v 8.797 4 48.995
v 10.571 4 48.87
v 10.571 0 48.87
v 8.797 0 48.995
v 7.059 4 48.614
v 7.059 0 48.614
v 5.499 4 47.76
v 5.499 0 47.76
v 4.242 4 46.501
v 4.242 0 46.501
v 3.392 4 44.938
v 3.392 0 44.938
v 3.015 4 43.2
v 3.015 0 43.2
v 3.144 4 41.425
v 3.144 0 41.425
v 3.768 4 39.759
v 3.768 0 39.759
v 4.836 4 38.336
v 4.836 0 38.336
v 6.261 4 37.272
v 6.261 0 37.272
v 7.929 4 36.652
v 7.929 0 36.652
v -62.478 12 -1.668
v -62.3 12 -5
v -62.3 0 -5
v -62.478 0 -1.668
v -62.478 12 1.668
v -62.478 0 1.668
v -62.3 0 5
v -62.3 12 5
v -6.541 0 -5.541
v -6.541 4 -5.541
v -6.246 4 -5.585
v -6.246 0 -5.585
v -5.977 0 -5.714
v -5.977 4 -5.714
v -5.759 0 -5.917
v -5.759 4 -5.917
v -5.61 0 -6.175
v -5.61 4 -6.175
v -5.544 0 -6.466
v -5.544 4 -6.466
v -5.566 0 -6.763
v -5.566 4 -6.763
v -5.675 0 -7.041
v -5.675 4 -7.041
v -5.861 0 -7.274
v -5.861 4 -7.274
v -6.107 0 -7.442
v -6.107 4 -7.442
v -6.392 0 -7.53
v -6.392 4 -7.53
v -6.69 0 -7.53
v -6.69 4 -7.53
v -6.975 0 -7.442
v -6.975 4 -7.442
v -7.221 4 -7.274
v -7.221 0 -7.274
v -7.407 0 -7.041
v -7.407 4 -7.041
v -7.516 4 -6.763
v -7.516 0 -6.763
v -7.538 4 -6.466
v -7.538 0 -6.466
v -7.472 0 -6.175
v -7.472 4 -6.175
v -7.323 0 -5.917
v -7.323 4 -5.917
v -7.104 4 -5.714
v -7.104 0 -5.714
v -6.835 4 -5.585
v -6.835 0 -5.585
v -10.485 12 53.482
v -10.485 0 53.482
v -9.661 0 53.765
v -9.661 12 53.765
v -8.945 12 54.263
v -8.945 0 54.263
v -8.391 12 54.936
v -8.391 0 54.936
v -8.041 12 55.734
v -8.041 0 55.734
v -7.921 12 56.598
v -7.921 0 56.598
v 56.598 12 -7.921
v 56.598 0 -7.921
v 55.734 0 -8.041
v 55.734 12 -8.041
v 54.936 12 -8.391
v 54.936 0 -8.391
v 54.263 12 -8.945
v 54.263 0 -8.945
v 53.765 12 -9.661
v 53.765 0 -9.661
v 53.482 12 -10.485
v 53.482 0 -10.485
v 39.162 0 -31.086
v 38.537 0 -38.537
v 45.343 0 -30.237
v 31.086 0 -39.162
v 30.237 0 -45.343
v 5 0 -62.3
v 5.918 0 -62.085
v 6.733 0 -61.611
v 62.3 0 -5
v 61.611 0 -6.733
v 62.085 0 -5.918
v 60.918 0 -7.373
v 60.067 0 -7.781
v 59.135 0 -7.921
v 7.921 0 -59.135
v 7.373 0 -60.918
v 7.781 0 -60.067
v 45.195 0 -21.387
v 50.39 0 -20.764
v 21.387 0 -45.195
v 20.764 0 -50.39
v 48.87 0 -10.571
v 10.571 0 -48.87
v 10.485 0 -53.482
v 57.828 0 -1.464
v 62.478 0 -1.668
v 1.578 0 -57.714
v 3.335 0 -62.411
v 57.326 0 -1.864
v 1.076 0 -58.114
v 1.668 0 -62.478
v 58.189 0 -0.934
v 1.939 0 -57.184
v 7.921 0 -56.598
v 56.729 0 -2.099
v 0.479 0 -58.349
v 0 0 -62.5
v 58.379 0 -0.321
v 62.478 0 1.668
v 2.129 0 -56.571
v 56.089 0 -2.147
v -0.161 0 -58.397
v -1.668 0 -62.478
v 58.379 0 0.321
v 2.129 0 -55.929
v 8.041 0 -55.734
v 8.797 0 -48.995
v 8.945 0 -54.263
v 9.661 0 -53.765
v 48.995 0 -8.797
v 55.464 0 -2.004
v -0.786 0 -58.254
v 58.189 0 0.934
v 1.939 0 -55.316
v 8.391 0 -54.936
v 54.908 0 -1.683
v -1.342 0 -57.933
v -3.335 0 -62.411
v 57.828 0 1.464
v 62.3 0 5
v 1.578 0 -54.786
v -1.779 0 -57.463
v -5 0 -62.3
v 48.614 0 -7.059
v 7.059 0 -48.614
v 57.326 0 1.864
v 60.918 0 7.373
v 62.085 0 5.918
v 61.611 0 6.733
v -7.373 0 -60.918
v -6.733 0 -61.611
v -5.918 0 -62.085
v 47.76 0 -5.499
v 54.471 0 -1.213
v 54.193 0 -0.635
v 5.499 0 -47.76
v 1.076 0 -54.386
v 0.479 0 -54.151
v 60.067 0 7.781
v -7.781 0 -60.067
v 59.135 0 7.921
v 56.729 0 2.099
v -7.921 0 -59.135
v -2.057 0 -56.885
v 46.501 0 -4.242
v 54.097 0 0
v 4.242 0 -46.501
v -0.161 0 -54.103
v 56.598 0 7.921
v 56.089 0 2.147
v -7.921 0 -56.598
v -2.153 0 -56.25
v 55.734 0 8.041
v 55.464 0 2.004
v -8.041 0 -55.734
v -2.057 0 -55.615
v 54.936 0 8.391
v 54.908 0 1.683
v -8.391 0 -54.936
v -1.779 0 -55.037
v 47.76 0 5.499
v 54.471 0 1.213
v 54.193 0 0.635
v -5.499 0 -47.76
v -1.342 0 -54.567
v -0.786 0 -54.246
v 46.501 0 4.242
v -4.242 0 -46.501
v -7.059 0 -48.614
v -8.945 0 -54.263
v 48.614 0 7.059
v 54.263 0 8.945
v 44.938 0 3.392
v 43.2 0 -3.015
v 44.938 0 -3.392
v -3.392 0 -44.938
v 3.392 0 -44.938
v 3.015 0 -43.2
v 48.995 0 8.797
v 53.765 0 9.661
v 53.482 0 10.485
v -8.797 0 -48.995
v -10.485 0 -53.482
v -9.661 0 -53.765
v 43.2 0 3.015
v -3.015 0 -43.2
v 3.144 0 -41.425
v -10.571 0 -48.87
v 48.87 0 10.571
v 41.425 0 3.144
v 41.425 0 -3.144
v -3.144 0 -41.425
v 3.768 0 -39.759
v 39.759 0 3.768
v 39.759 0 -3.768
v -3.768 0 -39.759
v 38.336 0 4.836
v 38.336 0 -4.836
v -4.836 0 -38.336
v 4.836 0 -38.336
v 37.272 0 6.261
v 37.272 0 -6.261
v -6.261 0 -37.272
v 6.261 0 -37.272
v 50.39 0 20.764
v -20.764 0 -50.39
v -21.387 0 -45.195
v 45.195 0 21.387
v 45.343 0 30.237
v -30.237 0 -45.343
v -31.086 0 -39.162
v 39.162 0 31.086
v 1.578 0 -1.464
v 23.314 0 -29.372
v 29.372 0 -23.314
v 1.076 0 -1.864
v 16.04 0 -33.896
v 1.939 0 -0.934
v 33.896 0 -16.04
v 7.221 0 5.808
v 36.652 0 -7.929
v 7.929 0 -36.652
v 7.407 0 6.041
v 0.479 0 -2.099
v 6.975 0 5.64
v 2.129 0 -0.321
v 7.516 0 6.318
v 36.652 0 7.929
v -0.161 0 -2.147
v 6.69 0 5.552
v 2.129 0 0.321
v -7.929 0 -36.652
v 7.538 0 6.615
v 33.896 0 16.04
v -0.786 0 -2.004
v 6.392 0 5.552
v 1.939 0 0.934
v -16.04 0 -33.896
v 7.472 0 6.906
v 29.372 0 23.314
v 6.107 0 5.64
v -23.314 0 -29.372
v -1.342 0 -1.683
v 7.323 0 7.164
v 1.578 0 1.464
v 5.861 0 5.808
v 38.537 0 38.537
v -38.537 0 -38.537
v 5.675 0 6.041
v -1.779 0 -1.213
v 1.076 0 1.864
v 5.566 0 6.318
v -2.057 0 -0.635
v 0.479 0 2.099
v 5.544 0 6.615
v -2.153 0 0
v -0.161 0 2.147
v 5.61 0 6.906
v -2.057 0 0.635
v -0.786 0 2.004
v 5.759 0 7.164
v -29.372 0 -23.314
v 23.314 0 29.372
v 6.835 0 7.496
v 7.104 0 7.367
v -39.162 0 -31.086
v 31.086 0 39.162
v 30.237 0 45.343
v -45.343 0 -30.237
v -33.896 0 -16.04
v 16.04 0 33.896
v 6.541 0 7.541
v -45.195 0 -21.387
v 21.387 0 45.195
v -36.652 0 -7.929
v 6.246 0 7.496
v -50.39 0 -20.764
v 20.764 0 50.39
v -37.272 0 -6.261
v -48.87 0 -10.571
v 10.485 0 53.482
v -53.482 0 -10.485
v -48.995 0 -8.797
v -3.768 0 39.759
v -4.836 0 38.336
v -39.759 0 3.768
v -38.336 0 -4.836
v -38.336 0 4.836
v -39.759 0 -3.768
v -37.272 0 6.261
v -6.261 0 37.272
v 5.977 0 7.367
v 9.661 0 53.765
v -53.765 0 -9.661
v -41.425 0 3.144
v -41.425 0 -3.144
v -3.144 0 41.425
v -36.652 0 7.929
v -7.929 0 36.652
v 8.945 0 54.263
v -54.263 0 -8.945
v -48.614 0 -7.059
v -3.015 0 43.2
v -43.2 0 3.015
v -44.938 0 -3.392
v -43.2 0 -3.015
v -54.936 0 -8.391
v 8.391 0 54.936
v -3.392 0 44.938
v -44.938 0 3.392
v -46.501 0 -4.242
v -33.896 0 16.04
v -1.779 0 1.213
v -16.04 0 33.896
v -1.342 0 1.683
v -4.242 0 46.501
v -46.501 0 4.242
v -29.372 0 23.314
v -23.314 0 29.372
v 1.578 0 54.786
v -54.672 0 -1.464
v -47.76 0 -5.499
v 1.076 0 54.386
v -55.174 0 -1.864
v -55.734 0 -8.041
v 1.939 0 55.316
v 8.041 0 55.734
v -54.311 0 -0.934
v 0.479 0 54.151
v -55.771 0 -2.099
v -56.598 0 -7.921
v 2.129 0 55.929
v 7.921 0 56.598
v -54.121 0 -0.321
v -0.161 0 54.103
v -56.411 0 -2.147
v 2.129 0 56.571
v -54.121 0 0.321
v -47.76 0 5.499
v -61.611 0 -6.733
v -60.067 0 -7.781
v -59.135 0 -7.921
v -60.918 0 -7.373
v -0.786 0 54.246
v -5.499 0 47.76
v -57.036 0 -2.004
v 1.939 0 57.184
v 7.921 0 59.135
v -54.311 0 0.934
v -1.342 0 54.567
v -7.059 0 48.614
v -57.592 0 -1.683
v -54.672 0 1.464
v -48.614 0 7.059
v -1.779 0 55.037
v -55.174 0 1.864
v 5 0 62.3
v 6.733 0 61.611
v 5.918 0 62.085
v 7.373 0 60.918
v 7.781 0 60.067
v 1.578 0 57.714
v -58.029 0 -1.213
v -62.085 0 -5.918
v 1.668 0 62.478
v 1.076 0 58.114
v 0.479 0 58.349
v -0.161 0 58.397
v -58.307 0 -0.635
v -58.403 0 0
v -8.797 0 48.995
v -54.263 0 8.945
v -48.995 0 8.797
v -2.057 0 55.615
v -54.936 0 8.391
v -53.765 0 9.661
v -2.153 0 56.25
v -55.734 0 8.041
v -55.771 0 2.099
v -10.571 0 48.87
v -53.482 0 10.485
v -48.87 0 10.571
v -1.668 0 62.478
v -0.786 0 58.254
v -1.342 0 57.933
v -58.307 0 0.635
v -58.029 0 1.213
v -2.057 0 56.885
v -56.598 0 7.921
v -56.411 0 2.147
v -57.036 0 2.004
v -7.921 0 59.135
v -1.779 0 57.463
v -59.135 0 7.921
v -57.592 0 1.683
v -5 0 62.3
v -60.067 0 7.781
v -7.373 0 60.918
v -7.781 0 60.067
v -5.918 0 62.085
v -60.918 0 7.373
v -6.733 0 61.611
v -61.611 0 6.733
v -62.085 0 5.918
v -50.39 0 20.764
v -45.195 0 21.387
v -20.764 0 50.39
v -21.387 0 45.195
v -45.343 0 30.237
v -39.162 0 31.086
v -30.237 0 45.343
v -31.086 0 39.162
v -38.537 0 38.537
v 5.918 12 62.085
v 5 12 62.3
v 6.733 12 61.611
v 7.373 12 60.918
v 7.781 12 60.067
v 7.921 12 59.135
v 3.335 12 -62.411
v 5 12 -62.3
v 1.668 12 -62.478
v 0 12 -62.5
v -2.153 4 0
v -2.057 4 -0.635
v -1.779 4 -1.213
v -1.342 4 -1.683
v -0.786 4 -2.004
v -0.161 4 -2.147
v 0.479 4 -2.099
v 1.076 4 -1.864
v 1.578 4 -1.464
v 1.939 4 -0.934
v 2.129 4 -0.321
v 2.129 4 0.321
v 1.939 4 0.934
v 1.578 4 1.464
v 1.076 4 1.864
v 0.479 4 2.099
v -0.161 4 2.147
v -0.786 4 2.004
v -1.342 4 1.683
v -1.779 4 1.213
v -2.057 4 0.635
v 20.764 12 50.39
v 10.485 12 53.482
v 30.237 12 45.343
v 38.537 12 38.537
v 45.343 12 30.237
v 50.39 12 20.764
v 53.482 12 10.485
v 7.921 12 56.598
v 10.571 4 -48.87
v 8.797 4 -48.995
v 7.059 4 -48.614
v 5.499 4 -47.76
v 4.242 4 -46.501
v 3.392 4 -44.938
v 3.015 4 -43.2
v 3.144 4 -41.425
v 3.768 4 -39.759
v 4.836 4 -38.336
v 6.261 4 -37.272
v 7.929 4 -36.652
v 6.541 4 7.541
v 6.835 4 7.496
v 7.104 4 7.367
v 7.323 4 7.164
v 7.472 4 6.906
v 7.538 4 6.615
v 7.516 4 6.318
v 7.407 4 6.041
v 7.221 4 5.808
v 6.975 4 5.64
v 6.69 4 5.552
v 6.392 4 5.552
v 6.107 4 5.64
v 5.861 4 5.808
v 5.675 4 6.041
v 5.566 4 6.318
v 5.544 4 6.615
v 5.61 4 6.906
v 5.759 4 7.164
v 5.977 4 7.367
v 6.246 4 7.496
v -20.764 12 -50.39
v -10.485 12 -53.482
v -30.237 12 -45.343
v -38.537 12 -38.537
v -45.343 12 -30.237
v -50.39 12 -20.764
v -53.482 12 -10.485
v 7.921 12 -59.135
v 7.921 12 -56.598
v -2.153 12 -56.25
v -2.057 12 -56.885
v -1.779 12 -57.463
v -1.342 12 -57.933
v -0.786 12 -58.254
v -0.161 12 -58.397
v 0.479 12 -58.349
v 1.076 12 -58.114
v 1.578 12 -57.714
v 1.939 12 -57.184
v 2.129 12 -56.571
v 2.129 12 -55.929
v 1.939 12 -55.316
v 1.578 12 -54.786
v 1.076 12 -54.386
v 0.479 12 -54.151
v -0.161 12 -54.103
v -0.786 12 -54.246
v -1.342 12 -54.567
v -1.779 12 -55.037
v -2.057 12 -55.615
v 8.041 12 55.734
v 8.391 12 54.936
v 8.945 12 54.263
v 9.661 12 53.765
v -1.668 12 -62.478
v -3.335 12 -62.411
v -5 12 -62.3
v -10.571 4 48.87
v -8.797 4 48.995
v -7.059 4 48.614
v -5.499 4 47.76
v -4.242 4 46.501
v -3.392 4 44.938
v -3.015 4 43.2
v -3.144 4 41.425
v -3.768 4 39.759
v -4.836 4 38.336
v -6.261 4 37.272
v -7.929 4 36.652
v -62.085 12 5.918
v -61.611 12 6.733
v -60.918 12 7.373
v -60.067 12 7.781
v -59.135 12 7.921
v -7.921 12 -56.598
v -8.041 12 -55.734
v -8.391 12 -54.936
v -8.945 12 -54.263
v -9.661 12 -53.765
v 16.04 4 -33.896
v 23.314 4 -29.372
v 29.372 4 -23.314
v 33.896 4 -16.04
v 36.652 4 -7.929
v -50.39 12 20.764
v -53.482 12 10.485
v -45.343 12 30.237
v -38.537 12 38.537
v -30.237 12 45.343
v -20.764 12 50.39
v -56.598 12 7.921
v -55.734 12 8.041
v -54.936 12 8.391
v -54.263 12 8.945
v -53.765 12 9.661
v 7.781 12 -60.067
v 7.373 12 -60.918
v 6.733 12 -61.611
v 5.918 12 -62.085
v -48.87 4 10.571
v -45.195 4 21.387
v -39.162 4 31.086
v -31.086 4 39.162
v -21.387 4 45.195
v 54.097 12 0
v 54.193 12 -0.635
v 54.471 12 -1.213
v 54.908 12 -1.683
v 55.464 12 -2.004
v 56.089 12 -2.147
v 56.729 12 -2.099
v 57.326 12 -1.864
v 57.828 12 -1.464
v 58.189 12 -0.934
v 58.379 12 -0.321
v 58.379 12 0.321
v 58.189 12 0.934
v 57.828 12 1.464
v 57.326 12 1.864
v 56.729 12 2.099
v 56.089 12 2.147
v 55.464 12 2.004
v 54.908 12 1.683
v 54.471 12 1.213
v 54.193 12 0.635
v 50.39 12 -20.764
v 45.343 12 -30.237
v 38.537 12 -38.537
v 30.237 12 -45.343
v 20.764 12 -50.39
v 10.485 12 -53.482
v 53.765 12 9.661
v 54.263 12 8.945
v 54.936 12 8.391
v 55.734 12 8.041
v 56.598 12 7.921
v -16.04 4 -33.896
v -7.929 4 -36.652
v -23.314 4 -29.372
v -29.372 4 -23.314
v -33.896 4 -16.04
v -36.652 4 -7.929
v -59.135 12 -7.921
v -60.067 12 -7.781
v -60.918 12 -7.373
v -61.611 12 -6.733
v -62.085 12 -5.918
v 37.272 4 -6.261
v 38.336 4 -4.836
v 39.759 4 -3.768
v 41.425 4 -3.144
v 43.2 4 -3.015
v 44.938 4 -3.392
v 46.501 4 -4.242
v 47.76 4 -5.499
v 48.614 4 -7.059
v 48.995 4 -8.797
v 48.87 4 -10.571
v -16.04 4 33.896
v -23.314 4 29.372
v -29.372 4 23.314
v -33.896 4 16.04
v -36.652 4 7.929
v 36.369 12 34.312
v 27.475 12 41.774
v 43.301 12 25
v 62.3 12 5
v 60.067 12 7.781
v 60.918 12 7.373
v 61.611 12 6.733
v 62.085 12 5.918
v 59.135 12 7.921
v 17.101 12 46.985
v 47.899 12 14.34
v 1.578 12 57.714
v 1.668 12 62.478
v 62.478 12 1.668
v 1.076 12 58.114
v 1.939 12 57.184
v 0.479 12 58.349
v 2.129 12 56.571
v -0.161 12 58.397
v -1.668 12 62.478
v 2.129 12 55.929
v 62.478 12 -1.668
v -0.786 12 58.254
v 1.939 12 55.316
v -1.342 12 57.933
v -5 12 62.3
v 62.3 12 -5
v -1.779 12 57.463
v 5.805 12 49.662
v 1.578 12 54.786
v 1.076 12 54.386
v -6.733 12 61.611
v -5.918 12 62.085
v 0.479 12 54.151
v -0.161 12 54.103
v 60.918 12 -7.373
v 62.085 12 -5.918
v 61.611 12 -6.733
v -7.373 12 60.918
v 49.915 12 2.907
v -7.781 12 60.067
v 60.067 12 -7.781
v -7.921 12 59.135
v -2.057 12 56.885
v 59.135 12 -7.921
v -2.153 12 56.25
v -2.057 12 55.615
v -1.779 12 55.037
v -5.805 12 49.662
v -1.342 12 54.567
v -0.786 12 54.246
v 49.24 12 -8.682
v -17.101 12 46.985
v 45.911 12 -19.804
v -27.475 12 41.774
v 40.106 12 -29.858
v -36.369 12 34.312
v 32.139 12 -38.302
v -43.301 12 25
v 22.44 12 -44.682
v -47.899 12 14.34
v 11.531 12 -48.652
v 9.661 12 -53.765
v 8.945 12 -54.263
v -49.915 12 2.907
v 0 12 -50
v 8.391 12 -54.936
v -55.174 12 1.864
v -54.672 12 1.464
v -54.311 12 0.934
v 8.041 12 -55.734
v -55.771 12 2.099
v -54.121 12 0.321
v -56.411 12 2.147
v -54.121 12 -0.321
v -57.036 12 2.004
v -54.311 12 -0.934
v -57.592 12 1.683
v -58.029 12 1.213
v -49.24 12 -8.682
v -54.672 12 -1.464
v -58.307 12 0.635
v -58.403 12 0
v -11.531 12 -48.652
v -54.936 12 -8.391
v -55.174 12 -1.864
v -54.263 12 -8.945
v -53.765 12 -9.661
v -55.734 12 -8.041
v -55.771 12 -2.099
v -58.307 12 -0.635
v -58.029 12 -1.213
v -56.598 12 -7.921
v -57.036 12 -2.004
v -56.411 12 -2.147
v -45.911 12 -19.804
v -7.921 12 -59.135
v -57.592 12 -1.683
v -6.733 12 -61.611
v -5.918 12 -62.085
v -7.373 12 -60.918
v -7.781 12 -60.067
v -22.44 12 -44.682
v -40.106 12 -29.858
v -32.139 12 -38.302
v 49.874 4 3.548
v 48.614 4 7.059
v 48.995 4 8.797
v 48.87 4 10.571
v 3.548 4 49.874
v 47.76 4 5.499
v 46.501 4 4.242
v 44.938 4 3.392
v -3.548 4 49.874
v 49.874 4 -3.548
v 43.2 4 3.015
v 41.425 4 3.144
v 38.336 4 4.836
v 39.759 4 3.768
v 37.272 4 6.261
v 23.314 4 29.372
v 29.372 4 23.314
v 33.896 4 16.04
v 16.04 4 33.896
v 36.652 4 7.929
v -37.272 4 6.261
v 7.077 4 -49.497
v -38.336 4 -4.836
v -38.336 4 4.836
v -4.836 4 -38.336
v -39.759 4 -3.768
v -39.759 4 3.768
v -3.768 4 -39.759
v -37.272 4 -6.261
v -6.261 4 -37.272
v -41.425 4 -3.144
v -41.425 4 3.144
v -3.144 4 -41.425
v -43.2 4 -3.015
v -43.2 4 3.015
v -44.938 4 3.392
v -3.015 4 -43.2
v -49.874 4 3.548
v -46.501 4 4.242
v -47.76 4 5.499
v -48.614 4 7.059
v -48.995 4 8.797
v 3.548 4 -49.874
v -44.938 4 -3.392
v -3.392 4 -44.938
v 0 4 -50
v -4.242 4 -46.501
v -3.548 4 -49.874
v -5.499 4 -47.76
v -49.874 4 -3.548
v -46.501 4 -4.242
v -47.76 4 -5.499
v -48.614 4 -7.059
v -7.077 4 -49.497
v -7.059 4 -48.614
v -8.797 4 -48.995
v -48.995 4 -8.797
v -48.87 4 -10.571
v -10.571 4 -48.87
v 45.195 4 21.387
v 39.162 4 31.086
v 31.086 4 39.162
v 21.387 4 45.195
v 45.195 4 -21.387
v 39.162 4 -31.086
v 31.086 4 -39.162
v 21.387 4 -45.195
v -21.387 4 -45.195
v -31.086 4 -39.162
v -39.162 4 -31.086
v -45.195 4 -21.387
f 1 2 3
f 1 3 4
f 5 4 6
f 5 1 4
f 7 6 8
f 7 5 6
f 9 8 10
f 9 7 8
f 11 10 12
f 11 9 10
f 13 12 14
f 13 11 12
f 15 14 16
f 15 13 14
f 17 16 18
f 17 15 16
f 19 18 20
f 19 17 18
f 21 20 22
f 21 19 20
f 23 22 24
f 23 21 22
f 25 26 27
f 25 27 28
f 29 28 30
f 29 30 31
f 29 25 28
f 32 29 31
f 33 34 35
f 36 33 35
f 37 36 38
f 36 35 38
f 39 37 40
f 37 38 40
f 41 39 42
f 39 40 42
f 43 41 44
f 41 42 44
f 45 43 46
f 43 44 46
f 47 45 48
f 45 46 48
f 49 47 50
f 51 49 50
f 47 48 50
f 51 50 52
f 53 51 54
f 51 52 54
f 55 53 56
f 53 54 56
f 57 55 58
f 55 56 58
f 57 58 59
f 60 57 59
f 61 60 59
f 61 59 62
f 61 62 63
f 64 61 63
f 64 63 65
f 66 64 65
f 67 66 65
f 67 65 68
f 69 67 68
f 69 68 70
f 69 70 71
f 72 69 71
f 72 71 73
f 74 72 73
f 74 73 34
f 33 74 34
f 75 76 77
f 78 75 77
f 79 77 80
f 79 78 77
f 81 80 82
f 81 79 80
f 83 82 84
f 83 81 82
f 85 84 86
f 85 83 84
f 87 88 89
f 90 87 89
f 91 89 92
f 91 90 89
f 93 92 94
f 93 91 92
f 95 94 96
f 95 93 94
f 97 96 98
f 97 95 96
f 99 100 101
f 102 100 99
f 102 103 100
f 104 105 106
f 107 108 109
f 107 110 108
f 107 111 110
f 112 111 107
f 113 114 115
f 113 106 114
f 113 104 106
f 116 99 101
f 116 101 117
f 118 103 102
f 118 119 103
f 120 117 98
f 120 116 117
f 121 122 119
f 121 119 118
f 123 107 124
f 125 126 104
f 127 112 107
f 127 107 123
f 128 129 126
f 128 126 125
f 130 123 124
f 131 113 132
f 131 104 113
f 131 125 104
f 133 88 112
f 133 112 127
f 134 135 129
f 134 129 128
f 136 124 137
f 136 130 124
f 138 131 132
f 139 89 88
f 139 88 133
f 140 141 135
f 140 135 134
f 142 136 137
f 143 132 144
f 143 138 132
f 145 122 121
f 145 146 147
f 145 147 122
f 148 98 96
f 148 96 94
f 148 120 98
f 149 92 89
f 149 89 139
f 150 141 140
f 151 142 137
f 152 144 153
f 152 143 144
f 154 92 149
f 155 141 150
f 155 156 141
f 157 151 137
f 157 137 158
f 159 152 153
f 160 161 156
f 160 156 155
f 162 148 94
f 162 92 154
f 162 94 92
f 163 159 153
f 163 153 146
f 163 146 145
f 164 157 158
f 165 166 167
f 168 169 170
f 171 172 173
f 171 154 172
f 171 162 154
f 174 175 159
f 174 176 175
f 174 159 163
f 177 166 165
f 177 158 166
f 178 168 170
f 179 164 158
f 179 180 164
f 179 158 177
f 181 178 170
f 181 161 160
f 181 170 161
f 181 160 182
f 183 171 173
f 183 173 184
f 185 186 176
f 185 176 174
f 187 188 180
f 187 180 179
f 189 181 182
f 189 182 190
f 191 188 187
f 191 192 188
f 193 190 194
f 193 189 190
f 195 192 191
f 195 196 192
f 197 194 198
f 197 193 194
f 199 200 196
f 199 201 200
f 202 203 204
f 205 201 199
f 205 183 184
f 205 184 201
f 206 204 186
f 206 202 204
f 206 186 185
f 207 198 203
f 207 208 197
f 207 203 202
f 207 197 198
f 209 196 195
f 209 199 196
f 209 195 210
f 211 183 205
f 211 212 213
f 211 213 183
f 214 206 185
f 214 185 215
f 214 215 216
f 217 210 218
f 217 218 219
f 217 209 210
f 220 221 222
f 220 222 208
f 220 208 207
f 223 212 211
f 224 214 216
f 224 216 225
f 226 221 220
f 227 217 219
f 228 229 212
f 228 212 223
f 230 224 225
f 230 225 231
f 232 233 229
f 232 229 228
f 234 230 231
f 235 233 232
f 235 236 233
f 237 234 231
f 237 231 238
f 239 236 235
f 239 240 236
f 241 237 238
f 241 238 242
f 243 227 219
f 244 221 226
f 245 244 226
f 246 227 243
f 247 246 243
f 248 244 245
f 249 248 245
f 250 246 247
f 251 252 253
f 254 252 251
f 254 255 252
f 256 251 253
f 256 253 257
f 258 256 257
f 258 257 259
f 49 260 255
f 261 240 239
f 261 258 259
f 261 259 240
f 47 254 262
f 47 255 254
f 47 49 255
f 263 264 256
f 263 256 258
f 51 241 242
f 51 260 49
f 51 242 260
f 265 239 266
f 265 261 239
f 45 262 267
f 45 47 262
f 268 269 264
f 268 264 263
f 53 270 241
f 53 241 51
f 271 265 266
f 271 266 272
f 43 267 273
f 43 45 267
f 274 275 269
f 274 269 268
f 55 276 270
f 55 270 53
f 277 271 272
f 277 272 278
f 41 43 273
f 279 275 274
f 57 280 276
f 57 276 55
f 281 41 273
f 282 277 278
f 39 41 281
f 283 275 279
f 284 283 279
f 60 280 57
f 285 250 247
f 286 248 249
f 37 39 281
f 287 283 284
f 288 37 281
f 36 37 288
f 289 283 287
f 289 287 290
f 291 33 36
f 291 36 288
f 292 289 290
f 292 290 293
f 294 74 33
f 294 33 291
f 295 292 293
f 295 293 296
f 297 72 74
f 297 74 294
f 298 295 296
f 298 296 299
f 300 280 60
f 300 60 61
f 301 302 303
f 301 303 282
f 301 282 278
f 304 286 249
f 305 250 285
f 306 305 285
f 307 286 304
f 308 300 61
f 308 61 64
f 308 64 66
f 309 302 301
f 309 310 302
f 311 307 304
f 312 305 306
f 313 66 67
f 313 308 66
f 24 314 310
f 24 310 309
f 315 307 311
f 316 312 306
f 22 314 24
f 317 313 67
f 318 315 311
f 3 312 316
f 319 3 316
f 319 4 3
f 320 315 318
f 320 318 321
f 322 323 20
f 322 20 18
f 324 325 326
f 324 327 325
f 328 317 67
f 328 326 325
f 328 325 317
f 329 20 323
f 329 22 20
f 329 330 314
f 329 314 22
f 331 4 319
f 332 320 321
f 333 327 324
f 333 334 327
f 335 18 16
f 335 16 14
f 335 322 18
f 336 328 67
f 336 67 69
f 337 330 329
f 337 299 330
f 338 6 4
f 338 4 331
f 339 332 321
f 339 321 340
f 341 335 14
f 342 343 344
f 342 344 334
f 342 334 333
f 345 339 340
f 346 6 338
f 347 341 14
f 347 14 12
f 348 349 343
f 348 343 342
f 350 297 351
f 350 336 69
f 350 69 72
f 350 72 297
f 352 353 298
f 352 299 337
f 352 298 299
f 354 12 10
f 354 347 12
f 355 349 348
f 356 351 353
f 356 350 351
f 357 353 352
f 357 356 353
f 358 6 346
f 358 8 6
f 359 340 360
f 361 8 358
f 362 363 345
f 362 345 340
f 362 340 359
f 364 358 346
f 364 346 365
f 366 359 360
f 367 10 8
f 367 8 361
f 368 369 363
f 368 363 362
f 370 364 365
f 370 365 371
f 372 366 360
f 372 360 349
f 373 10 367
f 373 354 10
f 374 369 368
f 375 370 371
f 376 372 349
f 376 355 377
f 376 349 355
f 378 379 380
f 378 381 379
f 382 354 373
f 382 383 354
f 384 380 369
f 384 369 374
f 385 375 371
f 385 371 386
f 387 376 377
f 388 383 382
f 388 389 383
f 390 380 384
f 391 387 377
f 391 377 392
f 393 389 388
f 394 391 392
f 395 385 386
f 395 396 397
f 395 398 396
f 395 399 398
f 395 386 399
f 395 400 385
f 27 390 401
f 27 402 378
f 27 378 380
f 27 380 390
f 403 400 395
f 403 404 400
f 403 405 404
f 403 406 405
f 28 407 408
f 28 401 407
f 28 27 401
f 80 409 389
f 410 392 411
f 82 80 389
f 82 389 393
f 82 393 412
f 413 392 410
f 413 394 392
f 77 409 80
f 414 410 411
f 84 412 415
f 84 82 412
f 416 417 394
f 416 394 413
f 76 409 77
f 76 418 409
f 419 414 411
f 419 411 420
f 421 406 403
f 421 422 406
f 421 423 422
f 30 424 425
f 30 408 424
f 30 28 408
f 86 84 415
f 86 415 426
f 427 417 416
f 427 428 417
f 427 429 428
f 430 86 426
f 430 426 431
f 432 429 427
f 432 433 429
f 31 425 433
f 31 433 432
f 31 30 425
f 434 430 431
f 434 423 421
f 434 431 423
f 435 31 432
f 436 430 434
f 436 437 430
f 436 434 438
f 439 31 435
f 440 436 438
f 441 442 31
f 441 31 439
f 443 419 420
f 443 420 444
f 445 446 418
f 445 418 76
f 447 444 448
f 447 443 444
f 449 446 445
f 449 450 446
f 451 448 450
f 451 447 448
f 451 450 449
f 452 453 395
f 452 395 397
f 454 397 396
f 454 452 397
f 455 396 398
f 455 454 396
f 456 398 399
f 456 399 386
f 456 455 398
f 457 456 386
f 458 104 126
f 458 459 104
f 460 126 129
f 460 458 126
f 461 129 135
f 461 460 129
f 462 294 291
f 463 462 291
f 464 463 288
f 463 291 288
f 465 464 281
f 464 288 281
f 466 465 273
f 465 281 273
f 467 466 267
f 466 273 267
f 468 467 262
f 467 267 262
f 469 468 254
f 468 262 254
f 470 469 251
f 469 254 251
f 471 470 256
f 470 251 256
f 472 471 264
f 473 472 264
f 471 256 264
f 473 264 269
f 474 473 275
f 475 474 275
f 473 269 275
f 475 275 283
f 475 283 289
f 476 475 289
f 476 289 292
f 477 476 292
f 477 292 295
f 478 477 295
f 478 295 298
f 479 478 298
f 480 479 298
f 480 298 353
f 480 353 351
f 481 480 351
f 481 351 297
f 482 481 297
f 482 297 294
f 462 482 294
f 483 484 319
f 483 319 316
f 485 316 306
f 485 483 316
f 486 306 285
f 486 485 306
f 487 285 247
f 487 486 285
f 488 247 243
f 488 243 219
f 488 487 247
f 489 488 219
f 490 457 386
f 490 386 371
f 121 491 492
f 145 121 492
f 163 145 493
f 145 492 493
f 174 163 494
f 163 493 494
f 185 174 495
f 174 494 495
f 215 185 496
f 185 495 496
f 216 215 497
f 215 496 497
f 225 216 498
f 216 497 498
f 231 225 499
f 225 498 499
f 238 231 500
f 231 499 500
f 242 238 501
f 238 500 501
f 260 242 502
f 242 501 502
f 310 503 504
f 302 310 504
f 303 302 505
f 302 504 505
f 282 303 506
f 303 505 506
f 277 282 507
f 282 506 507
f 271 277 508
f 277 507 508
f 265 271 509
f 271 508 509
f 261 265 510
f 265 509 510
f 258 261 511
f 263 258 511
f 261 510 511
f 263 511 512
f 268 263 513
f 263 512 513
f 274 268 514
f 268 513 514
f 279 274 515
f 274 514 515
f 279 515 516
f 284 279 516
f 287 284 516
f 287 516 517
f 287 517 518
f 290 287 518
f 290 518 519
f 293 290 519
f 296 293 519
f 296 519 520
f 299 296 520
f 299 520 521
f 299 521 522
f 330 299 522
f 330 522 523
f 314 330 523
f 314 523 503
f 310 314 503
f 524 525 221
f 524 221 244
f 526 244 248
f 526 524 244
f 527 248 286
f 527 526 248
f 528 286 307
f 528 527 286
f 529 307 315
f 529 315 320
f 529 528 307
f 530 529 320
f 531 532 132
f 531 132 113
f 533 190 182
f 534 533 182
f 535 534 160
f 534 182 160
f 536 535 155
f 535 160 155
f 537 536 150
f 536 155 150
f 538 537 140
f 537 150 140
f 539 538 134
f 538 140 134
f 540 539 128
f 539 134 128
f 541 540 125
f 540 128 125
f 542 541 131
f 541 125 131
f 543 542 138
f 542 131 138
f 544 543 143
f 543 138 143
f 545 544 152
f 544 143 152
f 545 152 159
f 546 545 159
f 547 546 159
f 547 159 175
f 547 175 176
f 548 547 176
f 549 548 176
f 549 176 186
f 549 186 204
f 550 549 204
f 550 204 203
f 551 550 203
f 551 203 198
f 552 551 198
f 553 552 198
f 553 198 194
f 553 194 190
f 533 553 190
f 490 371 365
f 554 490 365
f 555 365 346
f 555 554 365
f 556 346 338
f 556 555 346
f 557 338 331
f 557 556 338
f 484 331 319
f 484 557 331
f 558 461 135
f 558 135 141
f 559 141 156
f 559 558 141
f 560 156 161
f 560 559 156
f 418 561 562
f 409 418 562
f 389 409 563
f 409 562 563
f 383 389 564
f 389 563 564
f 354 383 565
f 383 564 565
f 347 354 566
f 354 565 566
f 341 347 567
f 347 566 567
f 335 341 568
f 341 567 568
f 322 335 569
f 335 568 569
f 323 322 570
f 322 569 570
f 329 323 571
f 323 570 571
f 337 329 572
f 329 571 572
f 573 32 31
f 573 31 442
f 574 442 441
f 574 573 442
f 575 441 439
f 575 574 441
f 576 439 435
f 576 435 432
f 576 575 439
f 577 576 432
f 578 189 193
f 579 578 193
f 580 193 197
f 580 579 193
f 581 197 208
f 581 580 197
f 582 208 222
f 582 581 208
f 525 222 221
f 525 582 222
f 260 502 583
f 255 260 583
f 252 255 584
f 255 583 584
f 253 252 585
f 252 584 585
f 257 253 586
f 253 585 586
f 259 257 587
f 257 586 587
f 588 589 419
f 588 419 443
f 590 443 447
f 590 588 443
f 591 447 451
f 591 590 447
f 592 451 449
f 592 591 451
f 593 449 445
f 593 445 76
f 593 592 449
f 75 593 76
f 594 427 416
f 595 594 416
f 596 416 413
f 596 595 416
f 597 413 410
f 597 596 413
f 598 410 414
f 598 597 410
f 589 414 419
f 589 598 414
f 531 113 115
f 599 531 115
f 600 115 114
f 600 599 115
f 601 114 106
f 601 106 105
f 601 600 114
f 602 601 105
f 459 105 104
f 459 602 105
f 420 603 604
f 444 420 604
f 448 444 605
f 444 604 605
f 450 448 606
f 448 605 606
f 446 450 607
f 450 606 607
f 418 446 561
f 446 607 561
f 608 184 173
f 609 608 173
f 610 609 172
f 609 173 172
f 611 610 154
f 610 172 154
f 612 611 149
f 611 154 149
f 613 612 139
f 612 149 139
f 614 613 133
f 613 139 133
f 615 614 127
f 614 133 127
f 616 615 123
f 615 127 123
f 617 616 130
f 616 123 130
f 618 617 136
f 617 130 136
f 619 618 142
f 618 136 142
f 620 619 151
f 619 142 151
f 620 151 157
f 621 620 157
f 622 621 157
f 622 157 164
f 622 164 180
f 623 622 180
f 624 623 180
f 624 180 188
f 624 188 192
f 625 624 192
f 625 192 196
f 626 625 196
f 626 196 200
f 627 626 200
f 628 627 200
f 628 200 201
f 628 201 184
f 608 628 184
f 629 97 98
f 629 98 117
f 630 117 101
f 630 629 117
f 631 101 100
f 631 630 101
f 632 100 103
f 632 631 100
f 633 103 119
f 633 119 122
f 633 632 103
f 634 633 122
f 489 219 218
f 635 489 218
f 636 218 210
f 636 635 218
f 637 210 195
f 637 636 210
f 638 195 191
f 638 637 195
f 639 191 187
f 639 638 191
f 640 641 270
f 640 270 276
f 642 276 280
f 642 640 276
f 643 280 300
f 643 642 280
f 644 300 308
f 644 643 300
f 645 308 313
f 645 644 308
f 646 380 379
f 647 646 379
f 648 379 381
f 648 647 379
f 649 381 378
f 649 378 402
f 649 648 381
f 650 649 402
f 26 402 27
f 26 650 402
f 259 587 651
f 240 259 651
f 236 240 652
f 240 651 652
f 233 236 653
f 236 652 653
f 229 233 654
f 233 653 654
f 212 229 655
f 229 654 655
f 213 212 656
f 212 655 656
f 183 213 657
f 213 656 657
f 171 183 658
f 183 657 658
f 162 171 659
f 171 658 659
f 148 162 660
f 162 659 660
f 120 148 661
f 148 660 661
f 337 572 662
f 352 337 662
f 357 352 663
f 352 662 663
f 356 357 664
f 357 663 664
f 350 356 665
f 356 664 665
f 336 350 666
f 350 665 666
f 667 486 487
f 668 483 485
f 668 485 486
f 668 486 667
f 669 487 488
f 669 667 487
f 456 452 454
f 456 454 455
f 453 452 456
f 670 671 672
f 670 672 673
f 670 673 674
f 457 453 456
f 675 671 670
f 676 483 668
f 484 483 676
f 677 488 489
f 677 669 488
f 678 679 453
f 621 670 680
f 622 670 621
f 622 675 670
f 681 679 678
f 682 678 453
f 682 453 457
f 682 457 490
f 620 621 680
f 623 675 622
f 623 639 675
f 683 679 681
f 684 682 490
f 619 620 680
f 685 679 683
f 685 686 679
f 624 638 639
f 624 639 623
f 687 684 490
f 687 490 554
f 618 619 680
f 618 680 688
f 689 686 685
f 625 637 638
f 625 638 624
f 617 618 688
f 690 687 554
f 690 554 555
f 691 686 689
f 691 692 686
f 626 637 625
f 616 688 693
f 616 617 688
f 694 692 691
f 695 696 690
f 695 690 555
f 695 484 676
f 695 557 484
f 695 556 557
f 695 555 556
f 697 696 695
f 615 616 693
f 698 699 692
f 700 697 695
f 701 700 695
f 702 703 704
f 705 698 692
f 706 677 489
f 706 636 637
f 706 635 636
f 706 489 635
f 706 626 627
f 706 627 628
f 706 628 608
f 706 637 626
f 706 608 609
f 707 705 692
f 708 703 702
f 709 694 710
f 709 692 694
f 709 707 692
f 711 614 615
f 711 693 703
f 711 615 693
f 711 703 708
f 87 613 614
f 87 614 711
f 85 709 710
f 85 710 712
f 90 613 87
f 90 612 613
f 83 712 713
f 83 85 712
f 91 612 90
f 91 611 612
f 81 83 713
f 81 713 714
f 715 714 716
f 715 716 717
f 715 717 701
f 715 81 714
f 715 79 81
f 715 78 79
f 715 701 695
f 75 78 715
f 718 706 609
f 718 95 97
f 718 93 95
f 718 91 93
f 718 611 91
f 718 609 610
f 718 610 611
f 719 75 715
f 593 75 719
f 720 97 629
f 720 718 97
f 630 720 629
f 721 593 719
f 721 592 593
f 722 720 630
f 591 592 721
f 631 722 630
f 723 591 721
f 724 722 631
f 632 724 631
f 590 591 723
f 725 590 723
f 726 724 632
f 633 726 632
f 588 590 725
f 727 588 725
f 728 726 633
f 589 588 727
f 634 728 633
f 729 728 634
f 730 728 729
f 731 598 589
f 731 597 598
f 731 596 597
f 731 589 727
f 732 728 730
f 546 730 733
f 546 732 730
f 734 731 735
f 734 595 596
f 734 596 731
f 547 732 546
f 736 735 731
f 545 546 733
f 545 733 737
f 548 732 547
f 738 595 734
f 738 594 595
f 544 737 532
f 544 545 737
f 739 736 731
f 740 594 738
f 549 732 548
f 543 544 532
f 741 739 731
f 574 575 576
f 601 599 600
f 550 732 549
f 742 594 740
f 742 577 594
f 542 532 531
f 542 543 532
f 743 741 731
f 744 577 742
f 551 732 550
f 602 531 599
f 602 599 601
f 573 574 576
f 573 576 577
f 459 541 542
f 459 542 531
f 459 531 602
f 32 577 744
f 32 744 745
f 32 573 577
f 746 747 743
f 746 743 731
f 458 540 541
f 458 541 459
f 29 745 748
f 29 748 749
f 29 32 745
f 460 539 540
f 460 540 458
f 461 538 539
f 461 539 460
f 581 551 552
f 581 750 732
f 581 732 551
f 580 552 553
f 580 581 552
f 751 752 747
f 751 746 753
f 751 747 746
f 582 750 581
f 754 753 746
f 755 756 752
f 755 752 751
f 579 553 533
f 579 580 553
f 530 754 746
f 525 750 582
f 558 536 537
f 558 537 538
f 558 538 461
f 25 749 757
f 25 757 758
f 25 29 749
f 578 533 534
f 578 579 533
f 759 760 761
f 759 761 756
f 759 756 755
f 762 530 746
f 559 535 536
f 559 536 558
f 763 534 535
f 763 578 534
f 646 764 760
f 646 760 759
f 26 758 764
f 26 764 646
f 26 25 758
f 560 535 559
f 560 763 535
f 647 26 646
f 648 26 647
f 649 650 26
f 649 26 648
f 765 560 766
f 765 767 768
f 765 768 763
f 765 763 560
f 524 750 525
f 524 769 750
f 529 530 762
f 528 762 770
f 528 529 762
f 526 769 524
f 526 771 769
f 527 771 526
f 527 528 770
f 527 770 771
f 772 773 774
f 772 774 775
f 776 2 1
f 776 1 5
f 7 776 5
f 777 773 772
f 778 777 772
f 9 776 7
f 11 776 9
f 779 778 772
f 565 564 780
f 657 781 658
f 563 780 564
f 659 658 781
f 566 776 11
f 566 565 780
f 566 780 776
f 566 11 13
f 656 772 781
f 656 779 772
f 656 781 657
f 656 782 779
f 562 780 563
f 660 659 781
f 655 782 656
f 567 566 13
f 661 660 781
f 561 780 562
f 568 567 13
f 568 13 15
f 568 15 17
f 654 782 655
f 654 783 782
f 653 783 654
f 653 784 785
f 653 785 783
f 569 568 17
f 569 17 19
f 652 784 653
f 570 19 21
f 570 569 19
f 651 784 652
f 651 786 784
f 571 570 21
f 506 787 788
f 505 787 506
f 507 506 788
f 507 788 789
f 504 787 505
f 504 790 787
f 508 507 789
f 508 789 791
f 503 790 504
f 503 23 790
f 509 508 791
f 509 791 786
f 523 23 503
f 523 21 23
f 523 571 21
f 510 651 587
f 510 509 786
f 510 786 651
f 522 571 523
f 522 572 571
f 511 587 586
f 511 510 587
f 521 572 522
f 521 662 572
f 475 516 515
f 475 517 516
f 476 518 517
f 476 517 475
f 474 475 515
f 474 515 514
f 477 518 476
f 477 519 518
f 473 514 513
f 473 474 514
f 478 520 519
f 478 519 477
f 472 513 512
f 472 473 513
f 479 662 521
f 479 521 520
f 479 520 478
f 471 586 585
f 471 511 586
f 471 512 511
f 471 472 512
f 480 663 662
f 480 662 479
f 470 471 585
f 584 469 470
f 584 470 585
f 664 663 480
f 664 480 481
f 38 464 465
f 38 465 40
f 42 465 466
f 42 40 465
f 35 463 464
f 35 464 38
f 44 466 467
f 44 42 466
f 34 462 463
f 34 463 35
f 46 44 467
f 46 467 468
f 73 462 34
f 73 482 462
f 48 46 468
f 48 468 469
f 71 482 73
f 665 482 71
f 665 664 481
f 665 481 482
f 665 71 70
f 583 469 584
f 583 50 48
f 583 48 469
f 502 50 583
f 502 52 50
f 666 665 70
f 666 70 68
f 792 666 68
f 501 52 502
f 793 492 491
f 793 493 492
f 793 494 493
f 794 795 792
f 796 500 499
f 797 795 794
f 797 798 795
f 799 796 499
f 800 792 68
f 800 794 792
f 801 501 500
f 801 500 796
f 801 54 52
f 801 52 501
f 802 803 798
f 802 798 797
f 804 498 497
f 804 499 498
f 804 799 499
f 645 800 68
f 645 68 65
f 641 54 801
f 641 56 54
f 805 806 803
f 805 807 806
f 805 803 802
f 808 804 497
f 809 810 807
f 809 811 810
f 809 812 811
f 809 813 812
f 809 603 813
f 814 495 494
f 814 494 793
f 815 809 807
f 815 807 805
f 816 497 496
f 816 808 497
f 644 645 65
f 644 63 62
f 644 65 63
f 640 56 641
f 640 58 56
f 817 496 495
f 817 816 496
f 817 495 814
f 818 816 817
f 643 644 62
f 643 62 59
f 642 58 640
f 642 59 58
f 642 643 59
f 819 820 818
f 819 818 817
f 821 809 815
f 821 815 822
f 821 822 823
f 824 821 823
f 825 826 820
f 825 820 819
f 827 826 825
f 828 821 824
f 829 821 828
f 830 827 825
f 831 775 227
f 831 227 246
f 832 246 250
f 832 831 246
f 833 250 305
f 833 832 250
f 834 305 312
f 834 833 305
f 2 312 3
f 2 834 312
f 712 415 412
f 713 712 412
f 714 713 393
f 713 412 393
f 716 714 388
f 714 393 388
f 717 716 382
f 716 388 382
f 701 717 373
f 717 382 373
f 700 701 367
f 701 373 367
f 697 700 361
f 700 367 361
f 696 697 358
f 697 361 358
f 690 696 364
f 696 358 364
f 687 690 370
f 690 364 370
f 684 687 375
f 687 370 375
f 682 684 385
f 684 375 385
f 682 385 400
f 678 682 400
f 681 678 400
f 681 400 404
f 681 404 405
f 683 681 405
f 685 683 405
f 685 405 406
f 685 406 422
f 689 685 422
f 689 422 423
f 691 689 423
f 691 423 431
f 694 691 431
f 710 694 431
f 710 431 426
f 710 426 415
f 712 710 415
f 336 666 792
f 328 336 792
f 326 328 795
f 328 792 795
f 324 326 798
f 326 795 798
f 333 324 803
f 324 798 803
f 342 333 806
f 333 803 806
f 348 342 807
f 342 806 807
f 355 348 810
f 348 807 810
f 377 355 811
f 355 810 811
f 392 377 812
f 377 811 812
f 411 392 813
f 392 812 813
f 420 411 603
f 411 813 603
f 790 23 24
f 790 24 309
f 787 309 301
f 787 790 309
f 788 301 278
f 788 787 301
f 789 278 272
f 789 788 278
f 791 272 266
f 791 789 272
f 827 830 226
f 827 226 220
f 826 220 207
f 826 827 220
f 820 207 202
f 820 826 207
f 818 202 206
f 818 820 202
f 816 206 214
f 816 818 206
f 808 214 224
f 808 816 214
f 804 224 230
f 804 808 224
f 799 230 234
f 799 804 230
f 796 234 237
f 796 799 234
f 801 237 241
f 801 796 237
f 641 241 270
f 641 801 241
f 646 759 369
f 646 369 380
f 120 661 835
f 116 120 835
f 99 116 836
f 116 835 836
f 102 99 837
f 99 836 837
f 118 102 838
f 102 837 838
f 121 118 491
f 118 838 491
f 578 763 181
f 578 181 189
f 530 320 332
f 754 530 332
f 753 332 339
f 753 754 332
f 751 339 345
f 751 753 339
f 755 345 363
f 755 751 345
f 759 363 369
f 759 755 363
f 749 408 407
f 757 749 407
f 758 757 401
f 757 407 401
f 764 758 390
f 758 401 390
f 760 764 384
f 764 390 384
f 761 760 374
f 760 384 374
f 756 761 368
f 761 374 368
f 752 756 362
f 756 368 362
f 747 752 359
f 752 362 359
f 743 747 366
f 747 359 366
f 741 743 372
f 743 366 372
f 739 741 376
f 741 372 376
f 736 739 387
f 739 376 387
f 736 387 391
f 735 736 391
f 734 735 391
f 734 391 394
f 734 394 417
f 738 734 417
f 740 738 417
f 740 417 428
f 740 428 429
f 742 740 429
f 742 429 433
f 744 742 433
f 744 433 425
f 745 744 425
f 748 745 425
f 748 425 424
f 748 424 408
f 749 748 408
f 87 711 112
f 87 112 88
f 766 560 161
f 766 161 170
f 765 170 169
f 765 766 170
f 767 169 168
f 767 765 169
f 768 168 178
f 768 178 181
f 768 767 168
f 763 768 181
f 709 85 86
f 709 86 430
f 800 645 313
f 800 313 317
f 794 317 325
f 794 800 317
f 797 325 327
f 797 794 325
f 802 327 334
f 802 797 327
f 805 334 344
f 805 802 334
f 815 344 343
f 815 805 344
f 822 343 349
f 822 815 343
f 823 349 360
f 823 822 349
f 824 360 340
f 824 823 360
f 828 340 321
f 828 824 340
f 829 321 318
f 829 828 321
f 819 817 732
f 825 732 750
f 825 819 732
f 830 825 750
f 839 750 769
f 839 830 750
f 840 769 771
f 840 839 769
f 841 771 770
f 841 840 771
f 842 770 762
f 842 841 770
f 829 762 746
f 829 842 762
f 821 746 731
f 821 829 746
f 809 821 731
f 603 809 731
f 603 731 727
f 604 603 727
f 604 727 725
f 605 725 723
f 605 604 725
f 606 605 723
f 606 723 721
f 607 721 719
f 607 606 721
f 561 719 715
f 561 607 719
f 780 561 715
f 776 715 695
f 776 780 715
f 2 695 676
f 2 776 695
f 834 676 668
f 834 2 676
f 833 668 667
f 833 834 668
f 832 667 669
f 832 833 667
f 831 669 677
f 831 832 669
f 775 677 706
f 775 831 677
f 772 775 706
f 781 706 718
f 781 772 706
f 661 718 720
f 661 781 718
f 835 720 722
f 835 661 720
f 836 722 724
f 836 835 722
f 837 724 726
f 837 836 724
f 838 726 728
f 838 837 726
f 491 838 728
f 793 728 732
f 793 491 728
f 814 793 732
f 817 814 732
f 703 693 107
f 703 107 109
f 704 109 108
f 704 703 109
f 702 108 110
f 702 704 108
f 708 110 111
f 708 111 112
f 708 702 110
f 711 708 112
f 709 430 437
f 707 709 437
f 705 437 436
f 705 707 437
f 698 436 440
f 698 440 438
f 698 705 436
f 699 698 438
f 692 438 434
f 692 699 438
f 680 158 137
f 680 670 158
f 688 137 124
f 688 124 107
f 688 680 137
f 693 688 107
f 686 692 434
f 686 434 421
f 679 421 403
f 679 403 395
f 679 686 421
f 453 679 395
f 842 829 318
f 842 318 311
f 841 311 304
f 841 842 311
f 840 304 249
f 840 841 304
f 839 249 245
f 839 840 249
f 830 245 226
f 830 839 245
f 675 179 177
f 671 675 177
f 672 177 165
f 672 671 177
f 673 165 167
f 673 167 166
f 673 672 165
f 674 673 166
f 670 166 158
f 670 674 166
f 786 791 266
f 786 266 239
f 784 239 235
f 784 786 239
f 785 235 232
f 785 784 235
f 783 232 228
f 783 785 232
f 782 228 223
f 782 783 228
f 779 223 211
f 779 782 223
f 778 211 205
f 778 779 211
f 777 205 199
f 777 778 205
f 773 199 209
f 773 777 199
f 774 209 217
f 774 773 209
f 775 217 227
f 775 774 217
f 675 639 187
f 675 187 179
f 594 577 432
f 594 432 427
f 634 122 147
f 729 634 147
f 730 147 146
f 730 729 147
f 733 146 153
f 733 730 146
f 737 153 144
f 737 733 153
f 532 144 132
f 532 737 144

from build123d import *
from build123d.topology import SkipClean

# Parameters (mm, degrees)
CUT_EXTRUDE1_REACH               = 90.75
SKETCH2_R                        = 2
SKETCH2_R_2                      = 1
CUT_EXTRUDE2_REACH               = 90.75
F_18_0_1695_DIAMETER_HOLE1_D     = 4.3053
F_18_0_1695_DIAMETER_HOLE1_DEPTH = 12
CUT_EXTRUDE3_DEPTH               = 28


with BuildPart() as part:
    # Sketch1 → Revolve1 (revolve)
    with BuildSketch(Plane.XY, mode=Mode.PRIVATE) as revolve1_sk:
        Polygon((0, 0), (62.5, 0), (62.5, 12), (50, 12), (50, 4), (0, 4), align=None)
    revolve(revolve1_sk.sketch.rotate(Axis((0, 0, 0), (0, 1, 0)), 90), axis=Axis((0, 0, 0), (0, 1, 0)))

    # Sketch2 → Cut-Extrude1 (cut, up to next)
    with BuildSketch(Plane(origin=(0, 4, 0), x_dir=(1, 0, 0), z_dir=(0, 1, 0)), mode=Mode.PRIVATE) as cut_extrude1_sk1:
        with Locations(Location((0, 0, 0), (0, 0, 270))):
            Circle(SKETCH2_R)
    cut_extrude1_tool1 = extrude(cut_extrude1_sk1.sketch, amount=-CUT_EXTRUDE1_REACH, mode=Mode.PRIVATE) & part.part
    # Sketch2 → Cut-Extrude1 (cut, up to next)
    with BuildSketch(Plane(origin=(0, 4, 0), x_dir=(1, 0, 0), z_dir=(0, 1, 0)), mode=Mode.PRIVATE) as cut_extrude1_sk2:
        with Locations(Location((6.540737726, -6.540737726, 0), (0, 0, 270))):
            Circle(SKETCH2_R_2)
    cut_extrude1_tool2 = extrude(cut_extrude1_sk2.sketch, amount=-CUT_EXTRUDE1_REACH, mode=Mode.PRIVATE) & part.part
    # Sketch2 → Cut-Extrude1 (cut, up to next)
    with BuildSketch(Plane(origin=(0, 4, 0), x_dir=(1, 0, 0), z_dir=(0, 1, 0)), mode=Mode.PRIVATE) as cut_extrude1_sk3:
        with Locations(Location((-6.540737726, 6.540737726, 0), (0, 0, 270))):
            Circle(SKETCH2_R_2)
    cut_extrude1_tool3 = extrude(cut_extrude1_sk3.sketch, amount=-CUT_EXTRUDE1_REACH, mode=Mode.PRIVATE) & part.part
    add(cut_extrude1_tool1.solids().sort_by_distance((0, 4, 0))[0], mode=Mode.SUBTRACT)
    add(cut_extrude1_tool2.solids().sort_by_distance((6.540738, 4, 6.540738))[0], mode=Mode.SUBTRACT)
    add(cut_extrude1_tool3.solids().sort_by_distance((-6.540738, 4, -6.540738))[0], mode=Mode.SUBTRACT)

    # Sketch3 → Cut-Extrude2 (cut, up to next)
    with BuildSketch(Plane(origin=(0, 4, 0), x_dir=(1, 0, 0), z_dir=(0, 1, 0)), mode=Mode.PRIVATE) as cut_extrude2_sk1:
        with BuildLine():
            ThreePointArc((48.869672579, 10.571428571), (35.355339059, 35.355339059), (10.571428571, 48.869672579))
            ThreePointArc((10.571428571, 48.869672579), (3.141290928, 44.082392078), (7.928571429, 36.652254434))
            ThreePointArc((7.928571429, 36.652254434), (26.516504294, 26.516504294), (36.652254434, 7.928571429))
            ThreePointArc((36.652254434, 7.928571429), (44.082392078, 3.141290928), (48.869672579, 10.571428571))
        make_face()
    cut_extrude2_tool1 = extrude(cut_extrude2_sk1.sketch, amount=-CUT_EXTRUDE2_REACH, mode=Mode.PRIVATE) & part.part
    # Sketch3 → Cut-Extrude2 (cut, up to next)
    with BuildSketch(Plane(origin=(0, 4, 0), x_dir=(1, 0, 0), z_dir=(0, 1, 0)), mode=Mode.PRIVATE) as cut_extrude2_sk2:
        with BuildLine():
            ThreePointArc((-48.869672579, 10.571428571), (-35.355339059, 35.355339059), (-10.571428571, 48.869672579))
            ThreePointArc((-10.571428571, 48.869672579), (-3.141290928, 44.082392078), (-7.928571429, 36.652254434))
            ThreePointArc((-7.928571429, 36.652254434), (-26.516504294, 26.516504294), (-36.652254434, 7.928571429))
            ThreePointArc((-36.652254434, 7.928571429), (-44.082392078, 3.141290928), (-48.869672579, 10.571428571))
        make_face()
    cut_extrude2_tool2 = extrude(cut_extrude2_sk2.sketch, amount=-CUT_EXTRUDE2_REACH, mode=Mode.PRIVATE) & part.part
    # Sketch3 → Cut-Extrude2 (cut, up to next)
    with BuildSketch(Plane(origin=(0, 4, 0), x_dir=(1, 0, 0), z_dir=(0, 1, 0)), mode=Mode.PRIVATE) as cut_extrude2_sk3:
        with BuildLine():
            ThreePointArc((48.869672579, -10.571428571), (35.355339059, -35.355339059), (10.571428571, -48.869672579))
            ThreePointArc((10.571428571, -48.869672579), (3.141290928, -44.082392078), (7.928571429, -36.652254434))
            ThreePointArc((7.928571429, -36.652254434), (26.516504294, -26.516504294), (36.652254434, -7.928571429))
            ThreePointArc((36.652254434, -7.928571429), (44.082392078, -3.141290928), (48.869672579, -10.571428571))
        make_face()
    cut_extrude2_tool3 = extrude(cut_extrude2_sk3.sketch, amount=-CUT_EXTRUDE2_REACH, mode=Mode.PRIVATE) & part.part
    # Sketch3 → Cut-Extrude2 (cut, up to next)
    with BuildSketch(Plane(origin=(0, 4, 0), x_dir=(1, 0, 0), z_dir=(0, 1, 0)), mode=Mode.PRIVATE) as cut_extrude2_sk4:
        with BuildLine():
            ThreePointArc((-48.869672579, -10.571428571), (-35.355339059, -35.355339059), (-10.571428571, -48.869672579))
            ThreePointArc((-10.571428571, -48.869672579), (-3.141290928, -44.082392078), (-7.928571429, -36.652254434))
            ThreePointArc((-7.928571429, -36.652254434), (-26.516504294, -26.516504294), (-36.652254434, -7.928571429))
            ThreePointArc((-36.652254434, -7.928571429), (-44.082392078, -3.141290928), (-48.869672579, -10.571428571))
        make_face()
    cut_extrude2_tool4 = extrude(cut_extrude2_sk4.sketch, amount=-CUT_EXTRUDE2_REACH, mode=Mode.PRIVATE) & part.part
    add(cut_extrude2_tool1.solids().sort_by_distance((28.738526, 4, -28.738526))[0], mode=Mode.SUBTRACT)
    add(cut_extrude2_tool2.solids().sort_by_distance((-28.738526, 4, -28.738526))[0], mode=Mode.SUBTRACT)
    add(cut_extrude2_tool3.solids().sort_by_distance((28.738526, 4, 28.738526))[0], mode=Mode.SUBTRACT)
    add(cut_extrude2_tool4.solids().sort_by_distance((-28.738526, 4, 28.738526))[0], mode=Mode.SUBTRACT)

    # #18 (0.1695) Diameter Hole1
    with Locations(Plane(origin=(0, 12, 0), x_dir=(1, 0, 0), z_dir=(0, 1, 0))):
        with Locations((0, 56.25), (56.25, 0), (0, -56.25), (-56.25, 0), (0, 0)):
            Hole(F_18_0_1695_DIAMETER_HOLE1_D / 2, depth=F_18_0_1695_DIAMETER_HOLE1_DEPTH)

    # Sketch6 → Cut-Extrude3 (cut)
    with SkipClean():  # the faces are left unmerged after this step: merging them gives an invalid solid
        with BuildSketch(Plane(origin=(0, 19.982495649, 0), x_dir=(1, 0, 0), z_dir=(0, 1, 0))):
            with BuildLine():
                Line((-56.597564395, 7.921), (-59.13485528, 7.921))
                ThreePointArc((-59.13485528, 7.921), (-61.28824505, 7.07913898), (-62.299678972, 5))
                ThreePointArc((-62.299678972, 5), (-44.194173824, 44.194173824), (-5, 62.299678972))
                ThreePointArc((-5, 62.299678972), (-7.07913898, 61.28824505), (-7.921, 59.13485528))
                Line((-7.921, 59.13485528), (-7.921, 56.597564395))
                ThreePointArc((-7.921, 56.597564395), (-8.64446813, 54.579988512), (-10.485166883, 53.48187801))
                ThreePointArc((-10.485166883, 53.48187801), (-38.537319575, 38.537319575), (-53.48187801, 10.485166883))
                ThreePointArc((-53.48187801, 10.485166883), (-54.579988512, 8.64446813), (-56.597564395, 7.921))
            make_face()
            with BuildLine():
                Line((7.921, 56.597564395), (7.921, 59.13485528))
                ThreePointArc((7.921, 59.13485528), (7.07913898, 61.28824505), (5, 62.299678972))
                ThreePointArc((5, 62.299678972), (44.194173824, 44.194173824), (62.299678972, 5))
                ThreePointArc((62.299678972, 5), (61.28824505, 7.07913898), (59.13485528, 7.921))
                Line((59.13485528, 7.921), (56.597564395, 7.921))
                ThreePointArc((56.597564395, 7.921), (54.579988512, 8.64446813), (53.48187801, 10.485166883))
                ThreePointArc((53.48187801, 10.485166883), (38.537319575, 38.537319575), (10.485166883, 53.48187801))
                ThreePointArc((10.485166883, 53.48187801), (8.64446813, 54.579988512), (7.921, 56.597564395))
            make_face()
            with BuildLine():
                Line((56.597564395, -7.921), (59.13485528, -7.921))
                ThreePointArc((59.13485528, -7.921), (61.28824505, -7.07913898), (62.299678972, -5))
                ThreePointArc((62.299678972, -5), (44.194173824, -44.194173824), (5, -62.299678972))
                ThreePointArc((5, -62.299678972), (7.07913898, -61.28824505), (7.921, -59.13485528))
                Line((7.921, -59.13485528), (7.921, -56.597564395))
                ThreePointArc((7.921, -56.597564395), (8.64446813, -54.579988512), (10.485166883, -53.48187801))
                ThreePointArc((10.485166883, -53.48187801), (38.537319575, -38.537319575), (53.48187801, -10.485166883))
                ThreePointArc((53.48187801, -10.485166883), (54.579988512, -8.64446813), (56.597564395, -7.921))
            make_face()
            with BuildLine():
                Line((-7.921, -56.597564395), (-7.921, -59.13485528))
                ThreePointArc((-7.921, -59.13485528), (-7.07913898, -61.28824505), (-5, -62.299678972))
                ThreePointArc((-5, -62.299678972), (-44.194173824, -44.194173824), (-62.299678972, -5))
                ThreePointArc((-62.299678972, -5), (-61.28824505, -7.07913898), (-59.13485528, -7.921))
                Line((-59.13485528, -7.921), (-56.597564395, -7.921))
                ThreePointArc((-56.597564395, -7.921), (-54.579988512, -8.64446813), (-53.48187801, -10.485166883))
                ThreePointArc((-53.48187801, -10.485166883), (-38.537319575, -38.537319575), (-10.485166883, -53.48187801))
                ThreePointArc((-10.485166883, -53.48187801), (-8.64446813, -54.579988512), (-7.921, -56.597564395))
            make_face()
        extrude(amount=-CUT_EXTRUDE3_DEPTH, mode=Mode.SUBTRACT)


solid = part.part
